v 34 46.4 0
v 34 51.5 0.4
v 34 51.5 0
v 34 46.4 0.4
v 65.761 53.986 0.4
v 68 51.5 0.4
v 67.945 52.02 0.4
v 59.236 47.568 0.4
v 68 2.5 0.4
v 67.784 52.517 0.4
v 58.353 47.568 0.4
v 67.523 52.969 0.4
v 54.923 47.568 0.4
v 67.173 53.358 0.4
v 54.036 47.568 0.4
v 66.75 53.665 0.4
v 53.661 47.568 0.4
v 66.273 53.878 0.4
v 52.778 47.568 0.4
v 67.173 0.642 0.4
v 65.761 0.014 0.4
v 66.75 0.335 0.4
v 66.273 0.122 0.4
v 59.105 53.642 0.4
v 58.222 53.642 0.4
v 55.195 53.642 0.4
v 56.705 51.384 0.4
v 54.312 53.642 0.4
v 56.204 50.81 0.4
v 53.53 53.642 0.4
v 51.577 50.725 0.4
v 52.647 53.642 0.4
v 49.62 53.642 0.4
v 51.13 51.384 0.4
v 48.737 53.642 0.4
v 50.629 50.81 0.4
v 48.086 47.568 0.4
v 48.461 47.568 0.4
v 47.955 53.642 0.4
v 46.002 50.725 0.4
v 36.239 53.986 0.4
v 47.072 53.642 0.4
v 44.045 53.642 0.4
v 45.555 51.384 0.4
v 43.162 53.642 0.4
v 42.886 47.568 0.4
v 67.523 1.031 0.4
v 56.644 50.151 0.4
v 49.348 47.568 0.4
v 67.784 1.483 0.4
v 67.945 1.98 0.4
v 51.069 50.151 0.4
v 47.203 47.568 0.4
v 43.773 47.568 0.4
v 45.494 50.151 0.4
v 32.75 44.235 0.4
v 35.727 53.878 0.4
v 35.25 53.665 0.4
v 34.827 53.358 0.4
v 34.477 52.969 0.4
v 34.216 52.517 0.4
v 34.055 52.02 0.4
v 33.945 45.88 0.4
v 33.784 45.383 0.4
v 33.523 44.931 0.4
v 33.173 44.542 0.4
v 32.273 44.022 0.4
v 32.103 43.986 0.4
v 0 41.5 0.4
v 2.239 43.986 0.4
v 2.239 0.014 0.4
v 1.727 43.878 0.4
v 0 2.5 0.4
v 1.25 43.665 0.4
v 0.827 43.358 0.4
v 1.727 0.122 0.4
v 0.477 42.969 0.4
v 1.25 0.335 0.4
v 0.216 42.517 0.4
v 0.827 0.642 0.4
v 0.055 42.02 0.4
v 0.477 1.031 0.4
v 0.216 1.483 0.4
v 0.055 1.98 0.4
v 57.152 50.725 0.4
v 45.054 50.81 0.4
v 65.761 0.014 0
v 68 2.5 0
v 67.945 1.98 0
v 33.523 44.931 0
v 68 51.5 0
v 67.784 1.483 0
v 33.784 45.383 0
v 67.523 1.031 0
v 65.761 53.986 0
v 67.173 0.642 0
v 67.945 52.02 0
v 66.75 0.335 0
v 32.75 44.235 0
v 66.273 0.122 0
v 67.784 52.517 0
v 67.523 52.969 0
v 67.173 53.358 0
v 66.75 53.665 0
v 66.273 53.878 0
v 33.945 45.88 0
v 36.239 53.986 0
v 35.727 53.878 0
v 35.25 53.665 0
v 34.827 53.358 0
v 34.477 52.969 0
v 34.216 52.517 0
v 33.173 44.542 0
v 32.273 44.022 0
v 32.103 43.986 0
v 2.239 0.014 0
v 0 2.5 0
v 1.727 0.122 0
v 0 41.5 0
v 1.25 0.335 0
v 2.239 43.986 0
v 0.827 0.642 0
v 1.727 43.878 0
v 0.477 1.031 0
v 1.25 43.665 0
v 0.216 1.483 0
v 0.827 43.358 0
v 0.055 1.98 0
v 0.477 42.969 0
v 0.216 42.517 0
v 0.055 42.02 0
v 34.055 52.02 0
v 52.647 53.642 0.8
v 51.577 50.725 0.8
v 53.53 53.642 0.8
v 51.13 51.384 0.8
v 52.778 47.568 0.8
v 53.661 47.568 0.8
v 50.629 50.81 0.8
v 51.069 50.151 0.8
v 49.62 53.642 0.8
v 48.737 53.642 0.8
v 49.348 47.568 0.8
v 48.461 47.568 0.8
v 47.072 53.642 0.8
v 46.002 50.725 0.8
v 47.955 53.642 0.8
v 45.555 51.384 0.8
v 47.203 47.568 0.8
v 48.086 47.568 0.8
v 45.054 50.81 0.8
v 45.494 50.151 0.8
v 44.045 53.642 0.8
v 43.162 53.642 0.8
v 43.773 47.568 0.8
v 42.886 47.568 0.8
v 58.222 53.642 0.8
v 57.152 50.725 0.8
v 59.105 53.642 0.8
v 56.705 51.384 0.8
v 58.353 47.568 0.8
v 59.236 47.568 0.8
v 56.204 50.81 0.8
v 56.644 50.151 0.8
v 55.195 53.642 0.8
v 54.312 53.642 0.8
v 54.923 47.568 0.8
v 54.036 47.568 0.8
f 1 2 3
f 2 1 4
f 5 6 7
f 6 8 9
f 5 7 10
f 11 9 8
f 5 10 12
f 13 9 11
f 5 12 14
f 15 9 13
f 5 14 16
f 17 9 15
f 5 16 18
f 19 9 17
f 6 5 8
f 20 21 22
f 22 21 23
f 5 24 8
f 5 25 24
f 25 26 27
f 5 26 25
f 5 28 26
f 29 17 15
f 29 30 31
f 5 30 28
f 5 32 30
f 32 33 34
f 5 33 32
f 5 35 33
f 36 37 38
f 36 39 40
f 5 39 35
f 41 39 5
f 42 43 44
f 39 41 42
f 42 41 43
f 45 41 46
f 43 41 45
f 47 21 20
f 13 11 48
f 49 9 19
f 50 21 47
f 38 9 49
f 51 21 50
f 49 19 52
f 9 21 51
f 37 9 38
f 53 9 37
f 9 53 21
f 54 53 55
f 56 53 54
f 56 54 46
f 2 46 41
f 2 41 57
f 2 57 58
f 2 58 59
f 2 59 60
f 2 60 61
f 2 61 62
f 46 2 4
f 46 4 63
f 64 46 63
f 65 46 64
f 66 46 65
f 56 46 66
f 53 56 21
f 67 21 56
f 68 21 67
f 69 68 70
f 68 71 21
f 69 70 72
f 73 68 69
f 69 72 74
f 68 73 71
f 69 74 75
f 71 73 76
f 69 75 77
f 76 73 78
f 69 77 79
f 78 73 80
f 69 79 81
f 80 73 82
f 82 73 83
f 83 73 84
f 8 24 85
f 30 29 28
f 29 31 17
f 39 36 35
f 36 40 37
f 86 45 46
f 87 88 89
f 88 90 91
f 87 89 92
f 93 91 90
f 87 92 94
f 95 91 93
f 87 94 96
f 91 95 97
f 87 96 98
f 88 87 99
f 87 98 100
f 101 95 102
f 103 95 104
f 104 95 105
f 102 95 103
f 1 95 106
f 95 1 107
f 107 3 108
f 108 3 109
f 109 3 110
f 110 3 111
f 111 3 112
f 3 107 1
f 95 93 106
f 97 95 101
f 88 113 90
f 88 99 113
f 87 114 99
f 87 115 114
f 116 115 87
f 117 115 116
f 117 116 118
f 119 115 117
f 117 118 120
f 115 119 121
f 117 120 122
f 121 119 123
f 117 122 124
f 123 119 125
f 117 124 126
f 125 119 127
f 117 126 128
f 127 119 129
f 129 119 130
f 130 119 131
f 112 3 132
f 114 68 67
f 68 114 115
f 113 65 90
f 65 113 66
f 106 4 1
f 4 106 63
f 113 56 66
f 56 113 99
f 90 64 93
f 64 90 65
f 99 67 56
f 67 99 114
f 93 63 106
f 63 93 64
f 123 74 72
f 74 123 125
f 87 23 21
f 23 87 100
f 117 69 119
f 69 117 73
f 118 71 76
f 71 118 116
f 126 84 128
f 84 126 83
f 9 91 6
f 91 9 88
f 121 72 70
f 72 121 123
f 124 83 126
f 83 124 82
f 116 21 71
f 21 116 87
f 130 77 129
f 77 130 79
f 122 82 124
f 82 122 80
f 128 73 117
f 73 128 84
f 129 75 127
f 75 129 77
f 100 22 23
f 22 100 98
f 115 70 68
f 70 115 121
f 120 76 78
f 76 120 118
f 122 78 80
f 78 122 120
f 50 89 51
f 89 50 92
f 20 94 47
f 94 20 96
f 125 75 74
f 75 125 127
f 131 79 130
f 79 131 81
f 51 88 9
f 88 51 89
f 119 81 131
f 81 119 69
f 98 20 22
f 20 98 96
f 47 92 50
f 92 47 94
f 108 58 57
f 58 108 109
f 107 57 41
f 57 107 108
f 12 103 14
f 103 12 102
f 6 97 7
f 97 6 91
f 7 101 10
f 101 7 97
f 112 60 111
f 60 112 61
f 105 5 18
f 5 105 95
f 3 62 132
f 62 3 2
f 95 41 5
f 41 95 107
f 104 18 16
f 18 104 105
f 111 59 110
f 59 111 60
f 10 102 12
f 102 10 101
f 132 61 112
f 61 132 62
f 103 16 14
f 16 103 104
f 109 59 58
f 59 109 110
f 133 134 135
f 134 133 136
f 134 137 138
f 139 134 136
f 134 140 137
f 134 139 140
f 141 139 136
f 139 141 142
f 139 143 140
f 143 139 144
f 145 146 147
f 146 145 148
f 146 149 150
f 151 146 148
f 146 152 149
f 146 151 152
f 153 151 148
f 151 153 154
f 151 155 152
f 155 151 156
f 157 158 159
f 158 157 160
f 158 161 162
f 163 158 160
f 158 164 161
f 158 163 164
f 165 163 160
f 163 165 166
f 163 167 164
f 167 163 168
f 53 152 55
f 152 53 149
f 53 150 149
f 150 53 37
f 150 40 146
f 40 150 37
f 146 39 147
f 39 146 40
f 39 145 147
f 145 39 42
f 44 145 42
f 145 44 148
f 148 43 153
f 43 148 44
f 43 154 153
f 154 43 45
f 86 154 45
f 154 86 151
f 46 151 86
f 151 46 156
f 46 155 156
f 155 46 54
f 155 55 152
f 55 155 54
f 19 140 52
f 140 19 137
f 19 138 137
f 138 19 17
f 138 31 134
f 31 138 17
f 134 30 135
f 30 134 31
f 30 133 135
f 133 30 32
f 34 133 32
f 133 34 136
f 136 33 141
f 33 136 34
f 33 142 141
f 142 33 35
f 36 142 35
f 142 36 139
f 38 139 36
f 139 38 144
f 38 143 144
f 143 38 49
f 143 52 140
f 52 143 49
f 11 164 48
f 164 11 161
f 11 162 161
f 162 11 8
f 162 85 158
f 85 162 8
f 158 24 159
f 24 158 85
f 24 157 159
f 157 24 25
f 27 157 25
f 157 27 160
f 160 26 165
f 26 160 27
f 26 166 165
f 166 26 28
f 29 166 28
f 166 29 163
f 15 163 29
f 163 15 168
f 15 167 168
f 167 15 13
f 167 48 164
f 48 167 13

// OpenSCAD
// file: divider_common.scad
H = 44;
W = 68;
THICK = 0.4;
TAB_H = 10;

RAD = 2.5;

PAD = 0.1;

$fn = 30;

module rounded(width, height) {
    w = width - RAD *2;
    h = height - RAD *2;
    hull() {
        translate([RAD, RAD, 0]) cube([w, h, THICK]);
        translate([RAD, RAD, 0]) cylinder(r=RAD, h=THICK);
        translate([RAD+w, RAD, 0]) cylinder(r=RAD, h=THICK);
        translate([RAD, RAD+h, 0]) cylinder(r=RAD, h=THICK);
        translate([RAD+w, RAD+h, 0]) cylinder(r=RAD, h=THICK);
    }
}
// main file
TEXT = "XXX";

include <divider_common.scad>

union() {
    rounded(W, H);
    translate([W/2,0,0]) rounded(W/2, H+TAB_H);

    translate([W/2-RAD*2, H-PAD, 0]) {
        difference() {
            translate([RAD,0,0]) cube([RAD, RAD, THICK]);
            translate([RAD, RAD, 0])cylinder(r=RAD, h=THICK);
        }
    }
    #translate([W/2/2 + W/2, H + TAB_H - 0.5, 0]) linear_extrude(THICK*2) text(TEXT, size=6, font="Gloucester MT Extra Condensed:style=Regular", valign="top", halign="center");
}
